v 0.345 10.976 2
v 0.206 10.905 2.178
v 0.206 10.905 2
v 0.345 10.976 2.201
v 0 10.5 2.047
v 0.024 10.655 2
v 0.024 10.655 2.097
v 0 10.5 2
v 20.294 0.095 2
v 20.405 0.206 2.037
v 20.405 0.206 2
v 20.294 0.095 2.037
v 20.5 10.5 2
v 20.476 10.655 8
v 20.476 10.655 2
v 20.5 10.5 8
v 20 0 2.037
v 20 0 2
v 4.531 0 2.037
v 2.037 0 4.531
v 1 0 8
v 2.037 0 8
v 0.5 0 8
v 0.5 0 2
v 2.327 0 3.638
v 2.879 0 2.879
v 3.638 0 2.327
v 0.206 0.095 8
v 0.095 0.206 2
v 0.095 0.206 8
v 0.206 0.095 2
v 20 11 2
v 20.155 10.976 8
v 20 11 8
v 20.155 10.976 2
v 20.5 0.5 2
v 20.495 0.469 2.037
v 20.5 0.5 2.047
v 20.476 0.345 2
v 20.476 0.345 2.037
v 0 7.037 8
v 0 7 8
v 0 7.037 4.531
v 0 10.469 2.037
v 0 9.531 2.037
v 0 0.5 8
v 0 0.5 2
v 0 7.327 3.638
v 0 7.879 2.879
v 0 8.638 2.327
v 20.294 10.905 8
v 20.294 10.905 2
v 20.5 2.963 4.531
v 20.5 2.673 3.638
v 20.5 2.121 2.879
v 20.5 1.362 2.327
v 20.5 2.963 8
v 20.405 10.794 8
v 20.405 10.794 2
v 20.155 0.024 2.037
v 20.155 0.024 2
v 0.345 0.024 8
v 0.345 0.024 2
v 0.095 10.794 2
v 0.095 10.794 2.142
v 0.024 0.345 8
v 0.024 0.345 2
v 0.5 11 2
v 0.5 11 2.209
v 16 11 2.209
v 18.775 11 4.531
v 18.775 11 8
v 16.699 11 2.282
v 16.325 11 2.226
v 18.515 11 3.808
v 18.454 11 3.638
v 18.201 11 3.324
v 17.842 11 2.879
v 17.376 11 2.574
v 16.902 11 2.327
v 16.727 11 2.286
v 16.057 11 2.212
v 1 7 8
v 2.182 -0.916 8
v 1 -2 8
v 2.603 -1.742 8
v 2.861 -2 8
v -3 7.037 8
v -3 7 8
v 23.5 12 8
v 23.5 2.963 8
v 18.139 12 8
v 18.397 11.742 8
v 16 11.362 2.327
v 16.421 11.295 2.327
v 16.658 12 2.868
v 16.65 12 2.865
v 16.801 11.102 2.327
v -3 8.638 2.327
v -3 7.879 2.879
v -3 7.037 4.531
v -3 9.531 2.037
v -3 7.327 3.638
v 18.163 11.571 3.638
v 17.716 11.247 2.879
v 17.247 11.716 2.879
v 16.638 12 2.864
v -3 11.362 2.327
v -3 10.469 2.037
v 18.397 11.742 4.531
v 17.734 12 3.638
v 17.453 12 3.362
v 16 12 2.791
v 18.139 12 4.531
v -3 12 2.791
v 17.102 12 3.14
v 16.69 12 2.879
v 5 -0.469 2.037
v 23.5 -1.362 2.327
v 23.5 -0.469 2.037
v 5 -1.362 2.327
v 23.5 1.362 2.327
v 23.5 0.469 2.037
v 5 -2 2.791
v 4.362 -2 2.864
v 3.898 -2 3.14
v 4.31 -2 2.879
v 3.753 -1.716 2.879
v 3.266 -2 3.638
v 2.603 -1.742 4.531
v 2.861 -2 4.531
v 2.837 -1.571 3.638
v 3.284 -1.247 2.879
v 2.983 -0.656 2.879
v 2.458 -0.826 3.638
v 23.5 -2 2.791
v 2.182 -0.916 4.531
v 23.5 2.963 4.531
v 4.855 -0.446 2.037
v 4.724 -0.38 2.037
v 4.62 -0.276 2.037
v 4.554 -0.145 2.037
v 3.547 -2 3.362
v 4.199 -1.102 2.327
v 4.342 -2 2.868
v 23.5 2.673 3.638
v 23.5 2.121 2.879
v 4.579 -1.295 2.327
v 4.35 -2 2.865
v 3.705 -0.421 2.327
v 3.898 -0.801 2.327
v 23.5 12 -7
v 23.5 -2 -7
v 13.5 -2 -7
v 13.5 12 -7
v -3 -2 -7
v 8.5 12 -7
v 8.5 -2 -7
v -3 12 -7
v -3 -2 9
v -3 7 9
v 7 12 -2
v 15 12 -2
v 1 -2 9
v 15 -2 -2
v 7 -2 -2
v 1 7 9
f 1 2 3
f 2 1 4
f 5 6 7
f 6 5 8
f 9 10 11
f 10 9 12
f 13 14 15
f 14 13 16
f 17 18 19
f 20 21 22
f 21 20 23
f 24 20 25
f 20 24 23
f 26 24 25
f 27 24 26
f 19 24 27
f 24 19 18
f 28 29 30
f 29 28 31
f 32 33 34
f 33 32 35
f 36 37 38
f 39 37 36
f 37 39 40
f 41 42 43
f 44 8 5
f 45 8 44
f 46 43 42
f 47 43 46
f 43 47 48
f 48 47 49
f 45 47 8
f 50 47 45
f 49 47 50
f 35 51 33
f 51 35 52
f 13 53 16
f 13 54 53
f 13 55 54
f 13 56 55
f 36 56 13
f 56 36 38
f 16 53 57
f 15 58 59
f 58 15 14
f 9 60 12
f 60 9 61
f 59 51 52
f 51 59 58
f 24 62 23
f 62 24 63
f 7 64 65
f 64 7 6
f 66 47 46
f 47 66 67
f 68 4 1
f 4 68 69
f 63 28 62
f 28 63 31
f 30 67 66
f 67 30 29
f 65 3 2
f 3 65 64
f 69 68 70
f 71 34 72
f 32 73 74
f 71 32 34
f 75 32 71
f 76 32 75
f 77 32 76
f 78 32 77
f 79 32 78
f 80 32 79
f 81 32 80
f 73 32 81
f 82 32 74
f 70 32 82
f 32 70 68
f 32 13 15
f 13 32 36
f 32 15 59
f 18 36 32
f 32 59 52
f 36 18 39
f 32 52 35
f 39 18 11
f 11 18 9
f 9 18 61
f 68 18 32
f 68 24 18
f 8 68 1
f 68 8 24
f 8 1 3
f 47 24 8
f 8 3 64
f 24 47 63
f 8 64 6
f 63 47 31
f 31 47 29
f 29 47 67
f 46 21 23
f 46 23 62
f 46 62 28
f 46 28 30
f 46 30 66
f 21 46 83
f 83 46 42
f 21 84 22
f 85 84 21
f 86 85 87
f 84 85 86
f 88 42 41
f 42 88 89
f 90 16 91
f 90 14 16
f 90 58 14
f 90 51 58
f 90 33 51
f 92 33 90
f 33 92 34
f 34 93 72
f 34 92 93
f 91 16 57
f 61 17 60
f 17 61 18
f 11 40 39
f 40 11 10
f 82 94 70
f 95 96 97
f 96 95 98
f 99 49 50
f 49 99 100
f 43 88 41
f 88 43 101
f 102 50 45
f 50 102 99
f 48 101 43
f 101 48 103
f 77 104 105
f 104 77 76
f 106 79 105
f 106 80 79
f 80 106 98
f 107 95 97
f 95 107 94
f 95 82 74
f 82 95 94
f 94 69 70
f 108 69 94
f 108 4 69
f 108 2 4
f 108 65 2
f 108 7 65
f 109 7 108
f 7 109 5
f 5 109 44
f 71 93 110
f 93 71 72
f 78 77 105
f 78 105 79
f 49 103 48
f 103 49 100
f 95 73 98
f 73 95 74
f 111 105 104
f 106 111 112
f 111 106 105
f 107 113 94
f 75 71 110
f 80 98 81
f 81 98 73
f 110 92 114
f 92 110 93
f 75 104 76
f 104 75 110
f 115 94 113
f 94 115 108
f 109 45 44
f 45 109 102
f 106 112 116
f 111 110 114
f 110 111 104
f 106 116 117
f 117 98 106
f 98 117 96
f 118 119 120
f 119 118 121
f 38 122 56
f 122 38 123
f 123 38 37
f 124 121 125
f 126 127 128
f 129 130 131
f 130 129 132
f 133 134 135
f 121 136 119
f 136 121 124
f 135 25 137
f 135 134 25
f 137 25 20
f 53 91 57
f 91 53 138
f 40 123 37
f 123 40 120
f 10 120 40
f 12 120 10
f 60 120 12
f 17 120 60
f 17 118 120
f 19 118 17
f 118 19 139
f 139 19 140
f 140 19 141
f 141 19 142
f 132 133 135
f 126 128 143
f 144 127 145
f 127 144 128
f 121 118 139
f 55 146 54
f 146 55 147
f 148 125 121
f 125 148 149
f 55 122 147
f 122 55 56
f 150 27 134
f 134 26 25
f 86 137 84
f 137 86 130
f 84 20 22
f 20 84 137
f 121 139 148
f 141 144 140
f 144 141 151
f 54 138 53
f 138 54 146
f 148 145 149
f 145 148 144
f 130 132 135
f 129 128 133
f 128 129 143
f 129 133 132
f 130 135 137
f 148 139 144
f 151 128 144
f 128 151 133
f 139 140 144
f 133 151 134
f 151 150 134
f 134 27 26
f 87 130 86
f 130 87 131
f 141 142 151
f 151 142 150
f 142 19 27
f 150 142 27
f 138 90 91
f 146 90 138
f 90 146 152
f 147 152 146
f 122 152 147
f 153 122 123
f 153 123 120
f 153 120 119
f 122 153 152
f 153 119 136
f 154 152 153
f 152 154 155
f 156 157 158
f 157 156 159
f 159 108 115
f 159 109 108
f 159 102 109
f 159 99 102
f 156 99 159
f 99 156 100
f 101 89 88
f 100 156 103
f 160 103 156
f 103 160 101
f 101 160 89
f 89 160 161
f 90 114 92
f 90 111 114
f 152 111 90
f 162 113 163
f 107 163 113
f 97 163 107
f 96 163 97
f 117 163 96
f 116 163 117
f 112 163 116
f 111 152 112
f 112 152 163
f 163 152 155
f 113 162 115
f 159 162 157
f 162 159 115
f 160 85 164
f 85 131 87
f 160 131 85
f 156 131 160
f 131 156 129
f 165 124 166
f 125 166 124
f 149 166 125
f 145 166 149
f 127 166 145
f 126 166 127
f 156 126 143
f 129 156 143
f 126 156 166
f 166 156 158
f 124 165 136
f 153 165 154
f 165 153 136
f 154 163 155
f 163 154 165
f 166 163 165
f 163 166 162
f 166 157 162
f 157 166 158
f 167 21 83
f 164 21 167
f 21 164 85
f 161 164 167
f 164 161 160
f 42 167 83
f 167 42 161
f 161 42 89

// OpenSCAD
// file: ../../globals.scad
/*
Most things in this file is represented as one millimeter, so keep that in mind while changing things.
Some of the setting are not mm but at variables that you can set, such as 2*x=2x and you are setting what x is.
I will try to specify when things are variables and not exact measurements.
*/

//Virindi settings
dovetail_male_width_scale = 0.98;
dovetail_male_height_scale = 0.91;

obj_leg = 30;
leg_length = 5.5;
small_number = 0.001;
metal_core_rode_global = 5;


///////////////// number of holes /////////////////////
z_hole_number = 8;
other_holes = 8;

///////////////// Pins /////////////////////

//pins that poke out
ball_size = 10;
pin_height = 20;
pin_diameter = 6;


//holes
hole_ball_size = ball_size;
hole_pin_height = pin_height;
hole_pin_diameter = pin_diameter;

///////////////// Z THINGS /////////////////////

berring_slot_width = 7.5;
berring_slot_depth = 6.5;
metal_core_rode = 5;

///////////////// X THINGS /////////////////////

//male dove tails
max_width=8;
min_width=5;
depth=5;
height=obj_leg/2;

//female dove tails, this is found on the y mounts
girl_max_width=11;
girl_min_width=5;
girl_depth=5;
girl_height=obj_leg;


///////////////// Y THINGS /////////////////////
/*
The Y is so normal that all of those global variables at the top should change all of the setting in it, this section is set her incase there are variables set in the future development of this project.
*/
// file: ../../include.scad
//////////////////      END SECTION       //////////////////

	module added_pins(){
		difference(){
			union(){
				translate([30/(15/4),obj_leg*leg_length,30/(15/4)]) pin();
				translate([30/(15/4)+14.5,obj_leg*leg_length,30/(15/4)+14]) pin();
			}
			union(){
							translate([30/(15/4)+13.5,obj_leg*leg_length-20,30/(15/4)+5])cube(size=[2,40,15]);
							translate([30/(15/4)+7.5,obj_leg*leg_length-20,30/(15/4)+15])rotate([0,90,0]) cube(size=[2,40,15]);	

							translate([30/(15/4)-1,obj_leg*leg_length-20,30/(15/4)-8])cube(size=[2,40,15]);
							translate([30/(15/4)-10,obj_leg*leg_length-20,30/(15/4)+1])rotate([0,90,0]) cube(size=[2,40,15]);
			}
		}
	}
	module taken_pins() {
		translate([30/(15/4)+14,obj_leg*leg_length-10,30/(15/4)]) mirror_pin();
		translate([30/(15/4),obj_leg*leg_length-10,30/(15/4)+15]) mirror_pin();
	}


//////////////////      OTHER STUFF       //////////////////

	module holes() {
		rotate([0,0,90]) for(y=[0:other_holes])
		translate([obj_leg+y*15,-15.5,7.5]) union() {
			translate([7.5,0,15]) hole_up();
			hole_down();
		}
	}
	module extend_holes() {
	module top(){
		rotate([0,0,90]) for(y=[0:other_holes+1])
		translate([(30/4)+y*15,-15.5,7.5]) union() {
			translate([7.5,0,15]) hole_up();
		}
	}
	module bottom(){
		rotate([0,0,90]) for(y=[0:other_holes+2])
		translate([(30/4)+y*15,-15.5,7.5]) union() {
			hole_down();
		
}
	}
	union(){
		top();
		bottom();
	}
	}

	module hole() {
		union() {
			rotate([90, 90, 0]) cylinder(h=40, d=hole_pin_diameter, center=true);
			translate([0,7.5,0]) sphere(d=hole_ball_size);
			translate([0,-6,0]) sphere(d=hole_ball_size);
		}
	}
	module hole_up() {
		union() {
			rotate([90, 90, 0]) cylinder(h=40, d=hole_pin_diameter, center=true);
			translate([0,7.5,10]) cylinder(h=hole_pin_height, d=hole_pin_diameter, center=true);
			translate([0,-6,10]) cylinder(h=hole_pin_height, d=hole_pin_diameter, center=true);
			translate([0,7.5,0]) sphere(d=hole_ball_size);
			translate([0,-6,0]) sphere(d=hole_ball_size);
		}
	}
	module hole_down() {
		union() {
			rotate([90, 90, 0]) cylinder(h=40, d=hole_pin_diameter, center=true);
			translate([0,7.5,-10]) cylinder(h=hole_pin_height, d=hole_pin_diameter, center=true);
			translate([0,-6,-10]) cylinder(h=hole_pin_height, d=hole_pin_diameter, center=true);
			translate([0,7.5,0]) sphere(d=hole_ball_size);
			translate([0,-6,0]) sphere(d=hole_ball_size);
		}
	}
	module pin() {
		union() {
			rotate([90, 90, 0]) cylinder(h=pin_height, d=pin_diameter, center=true);
			translate([0,7.5,0]) sphere(d=ball_size);
		}
	}

	module mirror_pin() {
		rotate([90, 90, 0]) cylinder(h=hole_pin_height+small_number, d=hole_pin_diameter, center=true);
		translate([0,-(pin_height-(ball_size/2)),0]) sphere(d=ball_size);
	}


//////////////////      SOME RACK AND Z THINGS       //////////////////

module z_holes() {
    rotate([0,-90,0]) for(z=[0:z_hole_number])
    translate([22.5+z*15,16,-12])
        hole();
}

module pin_cuts() {
	union(){
		cube(size=[2,10,40], center=true);
		rotate([0,0,90]) cube(size=[2,10,40], center=true);
	}
}
module pin_uncut() {
	union(){
		rotate([0, 0, 90]) cylinder(h=hole_pin_height, d=hole_pin_diameter, center=true);
		translate([0,0,10]) sphere(d=ball_hole);
	}
}


module pin_out() {
	union(){
		rotate([0, 0, 90]) cylinder(h=pin_height, d=pin_diameter, center=true);
		translate([0,0,10]) sphere(d= ball_size);
	}
}


module pins_z(){
	difference() {
		pin_out();
		pin_cuts();
	}
}
//////////////////      RACK AND SLIDE     ///////////////////

module straight_pins() {
	for(z=[0:((((obj_leg*leg_length)*2)-(obj_leg*2))/3)/14.5]) rotate([-90,0,0]) translate([z*15,30/(15/4),14]) pins_z();
	for(z=[0:((((obj_leg*leg_length)*2)-(obj_leg*2))/3)/14.5]) rotate([-90,0,0]) translate([z*15,30/(15/4)-14,14]) pins_z();
}
module stagger_pins() {
	for(z=[0:((((obj_leg*leg_length)*2)-(obj_leg*2))/3)/14.5]) rotate([-90,0,0]) translate([z*15,30/(15/4),14]) pins_z();
	for(z=[0:((((obj_leg*leg_length)*2)-(obj_leg*2))/3)/14.5]) rotate([-90,0,0]) translate([z*15+7,30/(15/4)-14,14]) pins_z();
}


//////////////////      DOVE TAIL       //////////////////

module male_dovetail(height) {
	dovetail_3d(max_width,min_width,depth,height);
}

module dovetail_3d(max_width=11, min_width=5, depth=5, height=30) {
	linear_extrude(height=height, convexity=2)
		dovetail_2d(max_width,min_width,depth);
}

module dovetail_2d(max_width=11, min_width=5, depth=5) {
	angle=atan((max_width/2-min_width/2)/depth);
	echo("angle: ", angle);
	polygon(paths=[[0,1,2,3,0]], points=[[-min_width/2,0], [-max_width/2,depth], [max_width/2, depth], [min_width/2,0]]);
}

//bow tie
	module tie_end(height){
				rotate([0,0,0]) translate([0,-0.01,((obj_leg/2)/2)]) male_dovetail(height);
				rotate([0,90,0]) translate([0,-0.01,((obj_leg/2)/2)]) male_dovetail(height);
				rotate([0,180,0]) translate([0,-0.01,((obj_leg/2)/2)]) male_dovetail(height);
				rotate([0,-90,0]) translate([0,-0.01,((obj_leg/2)/2)]) male_dovetail(height);
	}

module bow_support(){
	difference(){
		intersection(){
			translate([-15,0,-15]) cube([30,9,30]);
			scale([1.05,1.05,1.05]) rotate([0,45,0]) tie_end();
		}
		cube([29.2,29.2,29.2], center=true);
	}
}

	module wrap(units){
	for (y = [-1:units-2]) // two iterations, z = -1, z = 1
	{
			translate([15, (y*30)+15, 15]){
			for (r = [0:4]) // two iterations, z = -1, z = 1
			{
				rotate([0,r*90,0]) translate([0,15,15]) rotate([-90,0,0])male_dovetail(height=30);
			}
		}
	}
	}
// main file
include <../../include.scad>;
include <../../globals.scad>;
$fn=20;
switch_length = 20.5;
switch_depth = 6;
switch_width = 11;
radius = 1;

module button(){
	difference(){
		hull(){
			translate([radius/2,radius/2,0]) cylinder(h=switch_depth, d=radius);
			translate([switch_length-radius/2,radius/2,0]) cylinder(h=switch_depth, d=radius);
			translate([radius/2,switch_width-radius/2,0]) cylinder(h=switch_depth, d=radius);
			translate([switch_length-radius/2,switch_width-radius/2,0]) cylinder(h=switch_depth, d=radius);
		}
		//union(){
		//	translate([radius/2,radius/2,0]) cylinder(h=switch_depth, d=3);
		//	translate([switch_length-radius/2,switch_width-radius/2,0]) cylinder(h=switch_depth, d=3);
		//}
	}
}
module button_plus(){
	button();
	hull(){
		translate([-5,10,3]) sphere(r=3);
		translate([-5,10,10]) sphere(r=3);
		translate([16,10,3]) sphere(r=3);
		translate([16,10,10]) sphere(r=3);
	}
	
	hull(){
		translate([25,0,3]) sphere(r=3);
		translate([25,0,10]) sphere(r=3);
		translate([5,0,3]) sphere(r=3);
		translate([5,0,10]) sphere(r=3);
	}
}

translate([-3,-2,8]) cube([4,9,1]);

difference(){
	difference(){
		translate([-3,-2,-7]) cube([switch_length+6,switch_width+3,switch_depth+9]);
		translate([0,0,2]) button_plus();
	}
	#rotate([90,0,0]) translate([switch_width,-7,-13]) male_dovetail(height=15);
}
